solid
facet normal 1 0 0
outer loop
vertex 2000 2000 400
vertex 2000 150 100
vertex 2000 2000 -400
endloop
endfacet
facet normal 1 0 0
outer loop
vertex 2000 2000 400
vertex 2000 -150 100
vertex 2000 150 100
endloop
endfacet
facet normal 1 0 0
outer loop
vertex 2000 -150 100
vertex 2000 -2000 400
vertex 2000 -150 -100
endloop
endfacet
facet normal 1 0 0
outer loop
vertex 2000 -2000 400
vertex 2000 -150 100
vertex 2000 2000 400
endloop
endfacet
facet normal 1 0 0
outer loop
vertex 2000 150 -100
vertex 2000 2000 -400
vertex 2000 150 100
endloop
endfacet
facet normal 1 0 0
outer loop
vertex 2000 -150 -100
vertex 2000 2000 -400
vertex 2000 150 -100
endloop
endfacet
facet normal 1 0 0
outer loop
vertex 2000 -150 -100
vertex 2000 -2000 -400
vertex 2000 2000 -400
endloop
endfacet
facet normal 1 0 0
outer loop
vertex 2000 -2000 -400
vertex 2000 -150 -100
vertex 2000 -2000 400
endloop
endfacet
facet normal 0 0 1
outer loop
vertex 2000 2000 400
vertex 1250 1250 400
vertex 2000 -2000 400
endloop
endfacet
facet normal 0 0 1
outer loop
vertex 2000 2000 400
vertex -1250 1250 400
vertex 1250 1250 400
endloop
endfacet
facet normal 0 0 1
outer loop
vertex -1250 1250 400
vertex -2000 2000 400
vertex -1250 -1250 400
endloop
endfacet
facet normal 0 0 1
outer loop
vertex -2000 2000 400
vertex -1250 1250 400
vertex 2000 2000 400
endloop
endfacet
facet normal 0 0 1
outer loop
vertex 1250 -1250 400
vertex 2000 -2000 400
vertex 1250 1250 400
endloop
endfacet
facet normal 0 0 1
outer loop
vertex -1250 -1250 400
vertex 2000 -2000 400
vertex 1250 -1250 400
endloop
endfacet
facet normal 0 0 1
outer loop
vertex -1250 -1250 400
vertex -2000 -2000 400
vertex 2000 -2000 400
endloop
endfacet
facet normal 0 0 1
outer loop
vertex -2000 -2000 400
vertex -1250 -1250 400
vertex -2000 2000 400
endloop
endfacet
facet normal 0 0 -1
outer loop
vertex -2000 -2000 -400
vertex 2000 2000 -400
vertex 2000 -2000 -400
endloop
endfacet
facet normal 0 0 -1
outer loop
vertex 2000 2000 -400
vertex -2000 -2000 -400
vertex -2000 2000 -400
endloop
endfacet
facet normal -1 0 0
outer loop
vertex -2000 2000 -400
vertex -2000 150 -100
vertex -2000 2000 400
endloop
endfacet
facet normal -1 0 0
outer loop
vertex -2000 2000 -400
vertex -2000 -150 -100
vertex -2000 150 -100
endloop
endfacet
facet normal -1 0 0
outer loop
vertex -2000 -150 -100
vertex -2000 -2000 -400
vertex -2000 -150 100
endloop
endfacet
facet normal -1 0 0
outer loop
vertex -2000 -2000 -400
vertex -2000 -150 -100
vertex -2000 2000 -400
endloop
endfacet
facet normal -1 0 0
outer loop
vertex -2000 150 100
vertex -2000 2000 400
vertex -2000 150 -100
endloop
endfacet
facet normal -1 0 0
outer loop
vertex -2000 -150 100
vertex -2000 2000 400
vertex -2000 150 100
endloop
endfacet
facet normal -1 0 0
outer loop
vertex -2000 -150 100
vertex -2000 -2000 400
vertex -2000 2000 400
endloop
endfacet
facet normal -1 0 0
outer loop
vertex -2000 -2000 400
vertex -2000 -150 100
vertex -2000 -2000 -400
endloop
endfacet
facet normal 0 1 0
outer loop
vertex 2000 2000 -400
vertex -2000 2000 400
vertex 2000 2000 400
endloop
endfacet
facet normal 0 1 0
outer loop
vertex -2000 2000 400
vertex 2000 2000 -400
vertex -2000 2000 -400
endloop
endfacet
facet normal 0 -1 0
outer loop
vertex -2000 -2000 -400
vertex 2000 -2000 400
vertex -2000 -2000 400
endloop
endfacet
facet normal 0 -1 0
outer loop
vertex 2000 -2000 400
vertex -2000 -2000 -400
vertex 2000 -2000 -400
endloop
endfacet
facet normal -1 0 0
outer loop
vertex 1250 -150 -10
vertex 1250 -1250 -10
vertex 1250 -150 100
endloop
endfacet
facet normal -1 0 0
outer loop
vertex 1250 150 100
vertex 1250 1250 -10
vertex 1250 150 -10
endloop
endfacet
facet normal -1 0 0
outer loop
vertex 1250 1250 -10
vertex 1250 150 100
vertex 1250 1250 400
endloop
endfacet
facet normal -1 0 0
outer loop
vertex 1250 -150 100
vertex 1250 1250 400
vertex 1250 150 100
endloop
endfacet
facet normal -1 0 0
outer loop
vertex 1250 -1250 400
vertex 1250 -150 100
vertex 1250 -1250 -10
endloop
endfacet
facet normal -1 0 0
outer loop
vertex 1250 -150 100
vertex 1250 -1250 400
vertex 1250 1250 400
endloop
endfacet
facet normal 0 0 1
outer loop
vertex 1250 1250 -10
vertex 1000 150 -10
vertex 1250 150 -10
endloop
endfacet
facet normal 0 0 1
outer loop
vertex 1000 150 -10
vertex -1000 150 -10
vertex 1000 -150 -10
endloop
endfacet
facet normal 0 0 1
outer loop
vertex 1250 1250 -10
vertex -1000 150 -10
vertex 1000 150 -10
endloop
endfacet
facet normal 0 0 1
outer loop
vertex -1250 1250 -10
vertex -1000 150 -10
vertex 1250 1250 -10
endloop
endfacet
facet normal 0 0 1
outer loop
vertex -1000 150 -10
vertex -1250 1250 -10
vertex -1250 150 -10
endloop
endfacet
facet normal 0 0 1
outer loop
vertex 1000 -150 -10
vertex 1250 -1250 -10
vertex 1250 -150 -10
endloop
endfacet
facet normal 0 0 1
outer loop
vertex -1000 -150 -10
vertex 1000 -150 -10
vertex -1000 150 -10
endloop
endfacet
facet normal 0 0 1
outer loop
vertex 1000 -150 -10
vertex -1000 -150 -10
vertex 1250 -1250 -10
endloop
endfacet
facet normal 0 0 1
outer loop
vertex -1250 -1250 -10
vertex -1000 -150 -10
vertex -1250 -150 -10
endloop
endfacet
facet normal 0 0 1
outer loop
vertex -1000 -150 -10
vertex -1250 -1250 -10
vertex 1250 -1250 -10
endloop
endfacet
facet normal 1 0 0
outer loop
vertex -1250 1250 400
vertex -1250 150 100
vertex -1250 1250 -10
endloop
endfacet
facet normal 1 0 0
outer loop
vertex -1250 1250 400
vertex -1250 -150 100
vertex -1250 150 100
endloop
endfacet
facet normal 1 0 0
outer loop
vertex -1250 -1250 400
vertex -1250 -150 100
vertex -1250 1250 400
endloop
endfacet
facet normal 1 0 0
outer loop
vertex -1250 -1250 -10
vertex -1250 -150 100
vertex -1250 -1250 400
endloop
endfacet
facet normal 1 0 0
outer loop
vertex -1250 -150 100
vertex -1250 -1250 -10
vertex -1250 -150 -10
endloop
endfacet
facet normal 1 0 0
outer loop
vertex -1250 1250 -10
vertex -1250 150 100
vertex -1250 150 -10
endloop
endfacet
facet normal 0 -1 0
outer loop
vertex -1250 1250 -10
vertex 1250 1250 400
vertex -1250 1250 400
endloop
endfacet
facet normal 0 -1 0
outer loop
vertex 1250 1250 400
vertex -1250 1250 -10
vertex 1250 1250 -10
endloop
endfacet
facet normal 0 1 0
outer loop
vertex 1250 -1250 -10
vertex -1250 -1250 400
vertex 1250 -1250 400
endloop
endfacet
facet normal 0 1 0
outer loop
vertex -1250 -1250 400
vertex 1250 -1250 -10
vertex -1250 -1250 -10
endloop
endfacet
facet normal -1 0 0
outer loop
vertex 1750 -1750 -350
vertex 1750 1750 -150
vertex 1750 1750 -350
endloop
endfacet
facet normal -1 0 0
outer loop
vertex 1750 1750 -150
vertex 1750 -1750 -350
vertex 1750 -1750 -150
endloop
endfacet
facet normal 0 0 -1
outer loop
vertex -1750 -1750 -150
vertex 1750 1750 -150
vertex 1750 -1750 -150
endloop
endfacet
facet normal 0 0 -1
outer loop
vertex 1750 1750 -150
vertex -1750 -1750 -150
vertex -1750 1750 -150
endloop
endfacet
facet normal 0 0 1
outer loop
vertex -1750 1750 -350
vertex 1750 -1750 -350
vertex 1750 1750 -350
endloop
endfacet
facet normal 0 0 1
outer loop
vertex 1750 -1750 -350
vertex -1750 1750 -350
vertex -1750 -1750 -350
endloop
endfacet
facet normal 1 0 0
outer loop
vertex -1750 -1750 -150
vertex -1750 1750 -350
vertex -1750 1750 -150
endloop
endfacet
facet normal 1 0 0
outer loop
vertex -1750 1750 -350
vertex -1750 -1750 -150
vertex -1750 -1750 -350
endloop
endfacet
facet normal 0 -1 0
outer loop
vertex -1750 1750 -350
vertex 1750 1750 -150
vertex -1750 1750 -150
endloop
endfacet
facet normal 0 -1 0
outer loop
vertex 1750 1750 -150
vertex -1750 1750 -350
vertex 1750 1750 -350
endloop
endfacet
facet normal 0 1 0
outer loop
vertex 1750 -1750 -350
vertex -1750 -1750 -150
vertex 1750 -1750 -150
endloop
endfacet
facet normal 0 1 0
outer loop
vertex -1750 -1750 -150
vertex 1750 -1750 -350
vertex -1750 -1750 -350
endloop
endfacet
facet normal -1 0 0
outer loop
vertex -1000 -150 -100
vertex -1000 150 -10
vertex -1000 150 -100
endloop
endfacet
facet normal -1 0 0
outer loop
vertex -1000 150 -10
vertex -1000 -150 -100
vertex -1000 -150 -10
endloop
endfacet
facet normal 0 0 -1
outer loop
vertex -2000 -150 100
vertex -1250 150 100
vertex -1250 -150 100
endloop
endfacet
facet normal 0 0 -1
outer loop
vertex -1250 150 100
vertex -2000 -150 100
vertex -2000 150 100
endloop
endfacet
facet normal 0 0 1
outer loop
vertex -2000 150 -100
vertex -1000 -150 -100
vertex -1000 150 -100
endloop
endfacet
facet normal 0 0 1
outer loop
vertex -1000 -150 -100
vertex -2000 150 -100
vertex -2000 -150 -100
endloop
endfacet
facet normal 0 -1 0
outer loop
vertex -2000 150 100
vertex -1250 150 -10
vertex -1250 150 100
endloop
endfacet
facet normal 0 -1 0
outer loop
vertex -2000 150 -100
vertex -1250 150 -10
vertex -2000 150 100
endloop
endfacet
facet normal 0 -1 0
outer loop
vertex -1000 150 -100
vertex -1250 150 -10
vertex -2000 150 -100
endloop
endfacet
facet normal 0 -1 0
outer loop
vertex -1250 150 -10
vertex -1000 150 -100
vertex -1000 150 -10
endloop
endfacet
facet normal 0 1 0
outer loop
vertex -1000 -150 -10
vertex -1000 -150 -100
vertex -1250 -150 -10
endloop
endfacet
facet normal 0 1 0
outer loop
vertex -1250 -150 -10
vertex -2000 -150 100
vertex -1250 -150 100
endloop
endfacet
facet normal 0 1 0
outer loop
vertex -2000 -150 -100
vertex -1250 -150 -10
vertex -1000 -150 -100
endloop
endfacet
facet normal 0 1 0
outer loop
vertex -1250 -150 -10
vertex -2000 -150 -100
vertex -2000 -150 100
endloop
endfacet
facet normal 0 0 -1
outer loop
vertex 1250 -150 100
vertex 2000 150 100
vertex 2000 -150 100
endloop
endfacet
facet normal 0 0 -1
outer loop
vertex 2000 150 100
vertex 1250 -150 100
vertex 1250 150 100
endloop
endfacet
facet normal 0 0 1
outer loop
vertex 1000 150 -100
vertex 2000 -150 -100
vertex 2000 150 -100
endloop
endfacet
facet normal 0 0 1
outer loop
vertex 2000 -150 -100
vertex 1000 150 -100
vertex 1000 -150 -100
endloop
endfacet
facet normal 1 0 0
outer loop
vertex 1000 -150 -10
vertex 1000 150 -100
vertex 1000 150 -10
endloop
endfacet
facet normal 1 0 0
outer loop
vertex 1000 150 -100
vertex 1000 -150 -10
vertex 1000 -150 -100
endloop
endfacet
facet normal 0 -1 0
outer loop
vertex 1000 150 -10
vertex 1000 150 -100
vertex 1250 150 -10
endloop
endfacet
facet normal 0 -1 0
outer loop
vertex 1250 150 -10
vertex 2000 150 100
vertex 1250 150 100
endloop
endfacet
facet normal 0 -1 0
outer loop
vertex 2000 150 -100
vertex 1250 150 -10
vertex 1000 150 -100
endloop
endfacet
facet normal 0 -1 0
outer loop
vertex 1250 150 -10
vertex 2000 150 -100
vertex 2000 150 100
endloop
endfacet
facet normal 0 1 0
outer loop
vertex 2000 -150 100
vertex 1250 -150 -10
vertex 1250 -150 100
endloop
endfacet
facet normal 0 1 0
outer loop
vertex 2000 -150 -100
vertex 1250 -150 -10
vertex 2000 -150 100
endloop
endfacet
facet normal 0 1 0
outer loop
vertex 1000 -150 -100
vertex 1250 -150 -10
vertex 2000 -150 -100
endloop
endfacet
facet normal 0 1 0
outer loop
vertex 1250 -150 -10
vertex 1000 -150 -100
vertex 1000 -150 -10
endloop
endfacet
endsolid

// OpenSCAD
// =========================================================================
// GRUMMAN-STYLED INFLATABLE CARRIER - INTEGRATED 3D VAPOR CHAMBER
// MANUFACTURER: HUNTINGTON INGALLS / NEWPORT NEWS SHIPBUILDING
// MECHANICAL BLUEPRINT: HIGH-CURRENT THERMAL DISPERSION INTERFACE
// =========================================================================

module titanium_thermal_housing(length=4000, width=4000, thickness=800) {
    difference() {
        // High-Strength Grade 5 Titanium Mounting Block Base
        cube([length, width, thickness], center=true);
        
        // Central Subtractive Well for the 600A Umbilical Connection Node
        translate([0, 0, 200])
            cube([2500, 2500, thickness/2 + 20], center=true);
            
        // 3D Vapor Chamber Internal Cavity (Copper-Sintered Phase-Change Envelope)
        // Placed directly under the electrical bus interface to catch thermal soak
        translate([0, 0, -250])
            cube([3500, 3500, 200], center=true);
            
        // Sub-surface Routing Channels for Embedded Solid-State Harness
        translate([-length/2 + 500, 0, 0])
            cube([1000, 300, 200], center=true);
        translate([length/2 - 500, 0, 0])
            cube([1000, 300, 200], center=true);
    }
}

// Instantiate the high-power thermal housing module
titanium_thermal_housing();
